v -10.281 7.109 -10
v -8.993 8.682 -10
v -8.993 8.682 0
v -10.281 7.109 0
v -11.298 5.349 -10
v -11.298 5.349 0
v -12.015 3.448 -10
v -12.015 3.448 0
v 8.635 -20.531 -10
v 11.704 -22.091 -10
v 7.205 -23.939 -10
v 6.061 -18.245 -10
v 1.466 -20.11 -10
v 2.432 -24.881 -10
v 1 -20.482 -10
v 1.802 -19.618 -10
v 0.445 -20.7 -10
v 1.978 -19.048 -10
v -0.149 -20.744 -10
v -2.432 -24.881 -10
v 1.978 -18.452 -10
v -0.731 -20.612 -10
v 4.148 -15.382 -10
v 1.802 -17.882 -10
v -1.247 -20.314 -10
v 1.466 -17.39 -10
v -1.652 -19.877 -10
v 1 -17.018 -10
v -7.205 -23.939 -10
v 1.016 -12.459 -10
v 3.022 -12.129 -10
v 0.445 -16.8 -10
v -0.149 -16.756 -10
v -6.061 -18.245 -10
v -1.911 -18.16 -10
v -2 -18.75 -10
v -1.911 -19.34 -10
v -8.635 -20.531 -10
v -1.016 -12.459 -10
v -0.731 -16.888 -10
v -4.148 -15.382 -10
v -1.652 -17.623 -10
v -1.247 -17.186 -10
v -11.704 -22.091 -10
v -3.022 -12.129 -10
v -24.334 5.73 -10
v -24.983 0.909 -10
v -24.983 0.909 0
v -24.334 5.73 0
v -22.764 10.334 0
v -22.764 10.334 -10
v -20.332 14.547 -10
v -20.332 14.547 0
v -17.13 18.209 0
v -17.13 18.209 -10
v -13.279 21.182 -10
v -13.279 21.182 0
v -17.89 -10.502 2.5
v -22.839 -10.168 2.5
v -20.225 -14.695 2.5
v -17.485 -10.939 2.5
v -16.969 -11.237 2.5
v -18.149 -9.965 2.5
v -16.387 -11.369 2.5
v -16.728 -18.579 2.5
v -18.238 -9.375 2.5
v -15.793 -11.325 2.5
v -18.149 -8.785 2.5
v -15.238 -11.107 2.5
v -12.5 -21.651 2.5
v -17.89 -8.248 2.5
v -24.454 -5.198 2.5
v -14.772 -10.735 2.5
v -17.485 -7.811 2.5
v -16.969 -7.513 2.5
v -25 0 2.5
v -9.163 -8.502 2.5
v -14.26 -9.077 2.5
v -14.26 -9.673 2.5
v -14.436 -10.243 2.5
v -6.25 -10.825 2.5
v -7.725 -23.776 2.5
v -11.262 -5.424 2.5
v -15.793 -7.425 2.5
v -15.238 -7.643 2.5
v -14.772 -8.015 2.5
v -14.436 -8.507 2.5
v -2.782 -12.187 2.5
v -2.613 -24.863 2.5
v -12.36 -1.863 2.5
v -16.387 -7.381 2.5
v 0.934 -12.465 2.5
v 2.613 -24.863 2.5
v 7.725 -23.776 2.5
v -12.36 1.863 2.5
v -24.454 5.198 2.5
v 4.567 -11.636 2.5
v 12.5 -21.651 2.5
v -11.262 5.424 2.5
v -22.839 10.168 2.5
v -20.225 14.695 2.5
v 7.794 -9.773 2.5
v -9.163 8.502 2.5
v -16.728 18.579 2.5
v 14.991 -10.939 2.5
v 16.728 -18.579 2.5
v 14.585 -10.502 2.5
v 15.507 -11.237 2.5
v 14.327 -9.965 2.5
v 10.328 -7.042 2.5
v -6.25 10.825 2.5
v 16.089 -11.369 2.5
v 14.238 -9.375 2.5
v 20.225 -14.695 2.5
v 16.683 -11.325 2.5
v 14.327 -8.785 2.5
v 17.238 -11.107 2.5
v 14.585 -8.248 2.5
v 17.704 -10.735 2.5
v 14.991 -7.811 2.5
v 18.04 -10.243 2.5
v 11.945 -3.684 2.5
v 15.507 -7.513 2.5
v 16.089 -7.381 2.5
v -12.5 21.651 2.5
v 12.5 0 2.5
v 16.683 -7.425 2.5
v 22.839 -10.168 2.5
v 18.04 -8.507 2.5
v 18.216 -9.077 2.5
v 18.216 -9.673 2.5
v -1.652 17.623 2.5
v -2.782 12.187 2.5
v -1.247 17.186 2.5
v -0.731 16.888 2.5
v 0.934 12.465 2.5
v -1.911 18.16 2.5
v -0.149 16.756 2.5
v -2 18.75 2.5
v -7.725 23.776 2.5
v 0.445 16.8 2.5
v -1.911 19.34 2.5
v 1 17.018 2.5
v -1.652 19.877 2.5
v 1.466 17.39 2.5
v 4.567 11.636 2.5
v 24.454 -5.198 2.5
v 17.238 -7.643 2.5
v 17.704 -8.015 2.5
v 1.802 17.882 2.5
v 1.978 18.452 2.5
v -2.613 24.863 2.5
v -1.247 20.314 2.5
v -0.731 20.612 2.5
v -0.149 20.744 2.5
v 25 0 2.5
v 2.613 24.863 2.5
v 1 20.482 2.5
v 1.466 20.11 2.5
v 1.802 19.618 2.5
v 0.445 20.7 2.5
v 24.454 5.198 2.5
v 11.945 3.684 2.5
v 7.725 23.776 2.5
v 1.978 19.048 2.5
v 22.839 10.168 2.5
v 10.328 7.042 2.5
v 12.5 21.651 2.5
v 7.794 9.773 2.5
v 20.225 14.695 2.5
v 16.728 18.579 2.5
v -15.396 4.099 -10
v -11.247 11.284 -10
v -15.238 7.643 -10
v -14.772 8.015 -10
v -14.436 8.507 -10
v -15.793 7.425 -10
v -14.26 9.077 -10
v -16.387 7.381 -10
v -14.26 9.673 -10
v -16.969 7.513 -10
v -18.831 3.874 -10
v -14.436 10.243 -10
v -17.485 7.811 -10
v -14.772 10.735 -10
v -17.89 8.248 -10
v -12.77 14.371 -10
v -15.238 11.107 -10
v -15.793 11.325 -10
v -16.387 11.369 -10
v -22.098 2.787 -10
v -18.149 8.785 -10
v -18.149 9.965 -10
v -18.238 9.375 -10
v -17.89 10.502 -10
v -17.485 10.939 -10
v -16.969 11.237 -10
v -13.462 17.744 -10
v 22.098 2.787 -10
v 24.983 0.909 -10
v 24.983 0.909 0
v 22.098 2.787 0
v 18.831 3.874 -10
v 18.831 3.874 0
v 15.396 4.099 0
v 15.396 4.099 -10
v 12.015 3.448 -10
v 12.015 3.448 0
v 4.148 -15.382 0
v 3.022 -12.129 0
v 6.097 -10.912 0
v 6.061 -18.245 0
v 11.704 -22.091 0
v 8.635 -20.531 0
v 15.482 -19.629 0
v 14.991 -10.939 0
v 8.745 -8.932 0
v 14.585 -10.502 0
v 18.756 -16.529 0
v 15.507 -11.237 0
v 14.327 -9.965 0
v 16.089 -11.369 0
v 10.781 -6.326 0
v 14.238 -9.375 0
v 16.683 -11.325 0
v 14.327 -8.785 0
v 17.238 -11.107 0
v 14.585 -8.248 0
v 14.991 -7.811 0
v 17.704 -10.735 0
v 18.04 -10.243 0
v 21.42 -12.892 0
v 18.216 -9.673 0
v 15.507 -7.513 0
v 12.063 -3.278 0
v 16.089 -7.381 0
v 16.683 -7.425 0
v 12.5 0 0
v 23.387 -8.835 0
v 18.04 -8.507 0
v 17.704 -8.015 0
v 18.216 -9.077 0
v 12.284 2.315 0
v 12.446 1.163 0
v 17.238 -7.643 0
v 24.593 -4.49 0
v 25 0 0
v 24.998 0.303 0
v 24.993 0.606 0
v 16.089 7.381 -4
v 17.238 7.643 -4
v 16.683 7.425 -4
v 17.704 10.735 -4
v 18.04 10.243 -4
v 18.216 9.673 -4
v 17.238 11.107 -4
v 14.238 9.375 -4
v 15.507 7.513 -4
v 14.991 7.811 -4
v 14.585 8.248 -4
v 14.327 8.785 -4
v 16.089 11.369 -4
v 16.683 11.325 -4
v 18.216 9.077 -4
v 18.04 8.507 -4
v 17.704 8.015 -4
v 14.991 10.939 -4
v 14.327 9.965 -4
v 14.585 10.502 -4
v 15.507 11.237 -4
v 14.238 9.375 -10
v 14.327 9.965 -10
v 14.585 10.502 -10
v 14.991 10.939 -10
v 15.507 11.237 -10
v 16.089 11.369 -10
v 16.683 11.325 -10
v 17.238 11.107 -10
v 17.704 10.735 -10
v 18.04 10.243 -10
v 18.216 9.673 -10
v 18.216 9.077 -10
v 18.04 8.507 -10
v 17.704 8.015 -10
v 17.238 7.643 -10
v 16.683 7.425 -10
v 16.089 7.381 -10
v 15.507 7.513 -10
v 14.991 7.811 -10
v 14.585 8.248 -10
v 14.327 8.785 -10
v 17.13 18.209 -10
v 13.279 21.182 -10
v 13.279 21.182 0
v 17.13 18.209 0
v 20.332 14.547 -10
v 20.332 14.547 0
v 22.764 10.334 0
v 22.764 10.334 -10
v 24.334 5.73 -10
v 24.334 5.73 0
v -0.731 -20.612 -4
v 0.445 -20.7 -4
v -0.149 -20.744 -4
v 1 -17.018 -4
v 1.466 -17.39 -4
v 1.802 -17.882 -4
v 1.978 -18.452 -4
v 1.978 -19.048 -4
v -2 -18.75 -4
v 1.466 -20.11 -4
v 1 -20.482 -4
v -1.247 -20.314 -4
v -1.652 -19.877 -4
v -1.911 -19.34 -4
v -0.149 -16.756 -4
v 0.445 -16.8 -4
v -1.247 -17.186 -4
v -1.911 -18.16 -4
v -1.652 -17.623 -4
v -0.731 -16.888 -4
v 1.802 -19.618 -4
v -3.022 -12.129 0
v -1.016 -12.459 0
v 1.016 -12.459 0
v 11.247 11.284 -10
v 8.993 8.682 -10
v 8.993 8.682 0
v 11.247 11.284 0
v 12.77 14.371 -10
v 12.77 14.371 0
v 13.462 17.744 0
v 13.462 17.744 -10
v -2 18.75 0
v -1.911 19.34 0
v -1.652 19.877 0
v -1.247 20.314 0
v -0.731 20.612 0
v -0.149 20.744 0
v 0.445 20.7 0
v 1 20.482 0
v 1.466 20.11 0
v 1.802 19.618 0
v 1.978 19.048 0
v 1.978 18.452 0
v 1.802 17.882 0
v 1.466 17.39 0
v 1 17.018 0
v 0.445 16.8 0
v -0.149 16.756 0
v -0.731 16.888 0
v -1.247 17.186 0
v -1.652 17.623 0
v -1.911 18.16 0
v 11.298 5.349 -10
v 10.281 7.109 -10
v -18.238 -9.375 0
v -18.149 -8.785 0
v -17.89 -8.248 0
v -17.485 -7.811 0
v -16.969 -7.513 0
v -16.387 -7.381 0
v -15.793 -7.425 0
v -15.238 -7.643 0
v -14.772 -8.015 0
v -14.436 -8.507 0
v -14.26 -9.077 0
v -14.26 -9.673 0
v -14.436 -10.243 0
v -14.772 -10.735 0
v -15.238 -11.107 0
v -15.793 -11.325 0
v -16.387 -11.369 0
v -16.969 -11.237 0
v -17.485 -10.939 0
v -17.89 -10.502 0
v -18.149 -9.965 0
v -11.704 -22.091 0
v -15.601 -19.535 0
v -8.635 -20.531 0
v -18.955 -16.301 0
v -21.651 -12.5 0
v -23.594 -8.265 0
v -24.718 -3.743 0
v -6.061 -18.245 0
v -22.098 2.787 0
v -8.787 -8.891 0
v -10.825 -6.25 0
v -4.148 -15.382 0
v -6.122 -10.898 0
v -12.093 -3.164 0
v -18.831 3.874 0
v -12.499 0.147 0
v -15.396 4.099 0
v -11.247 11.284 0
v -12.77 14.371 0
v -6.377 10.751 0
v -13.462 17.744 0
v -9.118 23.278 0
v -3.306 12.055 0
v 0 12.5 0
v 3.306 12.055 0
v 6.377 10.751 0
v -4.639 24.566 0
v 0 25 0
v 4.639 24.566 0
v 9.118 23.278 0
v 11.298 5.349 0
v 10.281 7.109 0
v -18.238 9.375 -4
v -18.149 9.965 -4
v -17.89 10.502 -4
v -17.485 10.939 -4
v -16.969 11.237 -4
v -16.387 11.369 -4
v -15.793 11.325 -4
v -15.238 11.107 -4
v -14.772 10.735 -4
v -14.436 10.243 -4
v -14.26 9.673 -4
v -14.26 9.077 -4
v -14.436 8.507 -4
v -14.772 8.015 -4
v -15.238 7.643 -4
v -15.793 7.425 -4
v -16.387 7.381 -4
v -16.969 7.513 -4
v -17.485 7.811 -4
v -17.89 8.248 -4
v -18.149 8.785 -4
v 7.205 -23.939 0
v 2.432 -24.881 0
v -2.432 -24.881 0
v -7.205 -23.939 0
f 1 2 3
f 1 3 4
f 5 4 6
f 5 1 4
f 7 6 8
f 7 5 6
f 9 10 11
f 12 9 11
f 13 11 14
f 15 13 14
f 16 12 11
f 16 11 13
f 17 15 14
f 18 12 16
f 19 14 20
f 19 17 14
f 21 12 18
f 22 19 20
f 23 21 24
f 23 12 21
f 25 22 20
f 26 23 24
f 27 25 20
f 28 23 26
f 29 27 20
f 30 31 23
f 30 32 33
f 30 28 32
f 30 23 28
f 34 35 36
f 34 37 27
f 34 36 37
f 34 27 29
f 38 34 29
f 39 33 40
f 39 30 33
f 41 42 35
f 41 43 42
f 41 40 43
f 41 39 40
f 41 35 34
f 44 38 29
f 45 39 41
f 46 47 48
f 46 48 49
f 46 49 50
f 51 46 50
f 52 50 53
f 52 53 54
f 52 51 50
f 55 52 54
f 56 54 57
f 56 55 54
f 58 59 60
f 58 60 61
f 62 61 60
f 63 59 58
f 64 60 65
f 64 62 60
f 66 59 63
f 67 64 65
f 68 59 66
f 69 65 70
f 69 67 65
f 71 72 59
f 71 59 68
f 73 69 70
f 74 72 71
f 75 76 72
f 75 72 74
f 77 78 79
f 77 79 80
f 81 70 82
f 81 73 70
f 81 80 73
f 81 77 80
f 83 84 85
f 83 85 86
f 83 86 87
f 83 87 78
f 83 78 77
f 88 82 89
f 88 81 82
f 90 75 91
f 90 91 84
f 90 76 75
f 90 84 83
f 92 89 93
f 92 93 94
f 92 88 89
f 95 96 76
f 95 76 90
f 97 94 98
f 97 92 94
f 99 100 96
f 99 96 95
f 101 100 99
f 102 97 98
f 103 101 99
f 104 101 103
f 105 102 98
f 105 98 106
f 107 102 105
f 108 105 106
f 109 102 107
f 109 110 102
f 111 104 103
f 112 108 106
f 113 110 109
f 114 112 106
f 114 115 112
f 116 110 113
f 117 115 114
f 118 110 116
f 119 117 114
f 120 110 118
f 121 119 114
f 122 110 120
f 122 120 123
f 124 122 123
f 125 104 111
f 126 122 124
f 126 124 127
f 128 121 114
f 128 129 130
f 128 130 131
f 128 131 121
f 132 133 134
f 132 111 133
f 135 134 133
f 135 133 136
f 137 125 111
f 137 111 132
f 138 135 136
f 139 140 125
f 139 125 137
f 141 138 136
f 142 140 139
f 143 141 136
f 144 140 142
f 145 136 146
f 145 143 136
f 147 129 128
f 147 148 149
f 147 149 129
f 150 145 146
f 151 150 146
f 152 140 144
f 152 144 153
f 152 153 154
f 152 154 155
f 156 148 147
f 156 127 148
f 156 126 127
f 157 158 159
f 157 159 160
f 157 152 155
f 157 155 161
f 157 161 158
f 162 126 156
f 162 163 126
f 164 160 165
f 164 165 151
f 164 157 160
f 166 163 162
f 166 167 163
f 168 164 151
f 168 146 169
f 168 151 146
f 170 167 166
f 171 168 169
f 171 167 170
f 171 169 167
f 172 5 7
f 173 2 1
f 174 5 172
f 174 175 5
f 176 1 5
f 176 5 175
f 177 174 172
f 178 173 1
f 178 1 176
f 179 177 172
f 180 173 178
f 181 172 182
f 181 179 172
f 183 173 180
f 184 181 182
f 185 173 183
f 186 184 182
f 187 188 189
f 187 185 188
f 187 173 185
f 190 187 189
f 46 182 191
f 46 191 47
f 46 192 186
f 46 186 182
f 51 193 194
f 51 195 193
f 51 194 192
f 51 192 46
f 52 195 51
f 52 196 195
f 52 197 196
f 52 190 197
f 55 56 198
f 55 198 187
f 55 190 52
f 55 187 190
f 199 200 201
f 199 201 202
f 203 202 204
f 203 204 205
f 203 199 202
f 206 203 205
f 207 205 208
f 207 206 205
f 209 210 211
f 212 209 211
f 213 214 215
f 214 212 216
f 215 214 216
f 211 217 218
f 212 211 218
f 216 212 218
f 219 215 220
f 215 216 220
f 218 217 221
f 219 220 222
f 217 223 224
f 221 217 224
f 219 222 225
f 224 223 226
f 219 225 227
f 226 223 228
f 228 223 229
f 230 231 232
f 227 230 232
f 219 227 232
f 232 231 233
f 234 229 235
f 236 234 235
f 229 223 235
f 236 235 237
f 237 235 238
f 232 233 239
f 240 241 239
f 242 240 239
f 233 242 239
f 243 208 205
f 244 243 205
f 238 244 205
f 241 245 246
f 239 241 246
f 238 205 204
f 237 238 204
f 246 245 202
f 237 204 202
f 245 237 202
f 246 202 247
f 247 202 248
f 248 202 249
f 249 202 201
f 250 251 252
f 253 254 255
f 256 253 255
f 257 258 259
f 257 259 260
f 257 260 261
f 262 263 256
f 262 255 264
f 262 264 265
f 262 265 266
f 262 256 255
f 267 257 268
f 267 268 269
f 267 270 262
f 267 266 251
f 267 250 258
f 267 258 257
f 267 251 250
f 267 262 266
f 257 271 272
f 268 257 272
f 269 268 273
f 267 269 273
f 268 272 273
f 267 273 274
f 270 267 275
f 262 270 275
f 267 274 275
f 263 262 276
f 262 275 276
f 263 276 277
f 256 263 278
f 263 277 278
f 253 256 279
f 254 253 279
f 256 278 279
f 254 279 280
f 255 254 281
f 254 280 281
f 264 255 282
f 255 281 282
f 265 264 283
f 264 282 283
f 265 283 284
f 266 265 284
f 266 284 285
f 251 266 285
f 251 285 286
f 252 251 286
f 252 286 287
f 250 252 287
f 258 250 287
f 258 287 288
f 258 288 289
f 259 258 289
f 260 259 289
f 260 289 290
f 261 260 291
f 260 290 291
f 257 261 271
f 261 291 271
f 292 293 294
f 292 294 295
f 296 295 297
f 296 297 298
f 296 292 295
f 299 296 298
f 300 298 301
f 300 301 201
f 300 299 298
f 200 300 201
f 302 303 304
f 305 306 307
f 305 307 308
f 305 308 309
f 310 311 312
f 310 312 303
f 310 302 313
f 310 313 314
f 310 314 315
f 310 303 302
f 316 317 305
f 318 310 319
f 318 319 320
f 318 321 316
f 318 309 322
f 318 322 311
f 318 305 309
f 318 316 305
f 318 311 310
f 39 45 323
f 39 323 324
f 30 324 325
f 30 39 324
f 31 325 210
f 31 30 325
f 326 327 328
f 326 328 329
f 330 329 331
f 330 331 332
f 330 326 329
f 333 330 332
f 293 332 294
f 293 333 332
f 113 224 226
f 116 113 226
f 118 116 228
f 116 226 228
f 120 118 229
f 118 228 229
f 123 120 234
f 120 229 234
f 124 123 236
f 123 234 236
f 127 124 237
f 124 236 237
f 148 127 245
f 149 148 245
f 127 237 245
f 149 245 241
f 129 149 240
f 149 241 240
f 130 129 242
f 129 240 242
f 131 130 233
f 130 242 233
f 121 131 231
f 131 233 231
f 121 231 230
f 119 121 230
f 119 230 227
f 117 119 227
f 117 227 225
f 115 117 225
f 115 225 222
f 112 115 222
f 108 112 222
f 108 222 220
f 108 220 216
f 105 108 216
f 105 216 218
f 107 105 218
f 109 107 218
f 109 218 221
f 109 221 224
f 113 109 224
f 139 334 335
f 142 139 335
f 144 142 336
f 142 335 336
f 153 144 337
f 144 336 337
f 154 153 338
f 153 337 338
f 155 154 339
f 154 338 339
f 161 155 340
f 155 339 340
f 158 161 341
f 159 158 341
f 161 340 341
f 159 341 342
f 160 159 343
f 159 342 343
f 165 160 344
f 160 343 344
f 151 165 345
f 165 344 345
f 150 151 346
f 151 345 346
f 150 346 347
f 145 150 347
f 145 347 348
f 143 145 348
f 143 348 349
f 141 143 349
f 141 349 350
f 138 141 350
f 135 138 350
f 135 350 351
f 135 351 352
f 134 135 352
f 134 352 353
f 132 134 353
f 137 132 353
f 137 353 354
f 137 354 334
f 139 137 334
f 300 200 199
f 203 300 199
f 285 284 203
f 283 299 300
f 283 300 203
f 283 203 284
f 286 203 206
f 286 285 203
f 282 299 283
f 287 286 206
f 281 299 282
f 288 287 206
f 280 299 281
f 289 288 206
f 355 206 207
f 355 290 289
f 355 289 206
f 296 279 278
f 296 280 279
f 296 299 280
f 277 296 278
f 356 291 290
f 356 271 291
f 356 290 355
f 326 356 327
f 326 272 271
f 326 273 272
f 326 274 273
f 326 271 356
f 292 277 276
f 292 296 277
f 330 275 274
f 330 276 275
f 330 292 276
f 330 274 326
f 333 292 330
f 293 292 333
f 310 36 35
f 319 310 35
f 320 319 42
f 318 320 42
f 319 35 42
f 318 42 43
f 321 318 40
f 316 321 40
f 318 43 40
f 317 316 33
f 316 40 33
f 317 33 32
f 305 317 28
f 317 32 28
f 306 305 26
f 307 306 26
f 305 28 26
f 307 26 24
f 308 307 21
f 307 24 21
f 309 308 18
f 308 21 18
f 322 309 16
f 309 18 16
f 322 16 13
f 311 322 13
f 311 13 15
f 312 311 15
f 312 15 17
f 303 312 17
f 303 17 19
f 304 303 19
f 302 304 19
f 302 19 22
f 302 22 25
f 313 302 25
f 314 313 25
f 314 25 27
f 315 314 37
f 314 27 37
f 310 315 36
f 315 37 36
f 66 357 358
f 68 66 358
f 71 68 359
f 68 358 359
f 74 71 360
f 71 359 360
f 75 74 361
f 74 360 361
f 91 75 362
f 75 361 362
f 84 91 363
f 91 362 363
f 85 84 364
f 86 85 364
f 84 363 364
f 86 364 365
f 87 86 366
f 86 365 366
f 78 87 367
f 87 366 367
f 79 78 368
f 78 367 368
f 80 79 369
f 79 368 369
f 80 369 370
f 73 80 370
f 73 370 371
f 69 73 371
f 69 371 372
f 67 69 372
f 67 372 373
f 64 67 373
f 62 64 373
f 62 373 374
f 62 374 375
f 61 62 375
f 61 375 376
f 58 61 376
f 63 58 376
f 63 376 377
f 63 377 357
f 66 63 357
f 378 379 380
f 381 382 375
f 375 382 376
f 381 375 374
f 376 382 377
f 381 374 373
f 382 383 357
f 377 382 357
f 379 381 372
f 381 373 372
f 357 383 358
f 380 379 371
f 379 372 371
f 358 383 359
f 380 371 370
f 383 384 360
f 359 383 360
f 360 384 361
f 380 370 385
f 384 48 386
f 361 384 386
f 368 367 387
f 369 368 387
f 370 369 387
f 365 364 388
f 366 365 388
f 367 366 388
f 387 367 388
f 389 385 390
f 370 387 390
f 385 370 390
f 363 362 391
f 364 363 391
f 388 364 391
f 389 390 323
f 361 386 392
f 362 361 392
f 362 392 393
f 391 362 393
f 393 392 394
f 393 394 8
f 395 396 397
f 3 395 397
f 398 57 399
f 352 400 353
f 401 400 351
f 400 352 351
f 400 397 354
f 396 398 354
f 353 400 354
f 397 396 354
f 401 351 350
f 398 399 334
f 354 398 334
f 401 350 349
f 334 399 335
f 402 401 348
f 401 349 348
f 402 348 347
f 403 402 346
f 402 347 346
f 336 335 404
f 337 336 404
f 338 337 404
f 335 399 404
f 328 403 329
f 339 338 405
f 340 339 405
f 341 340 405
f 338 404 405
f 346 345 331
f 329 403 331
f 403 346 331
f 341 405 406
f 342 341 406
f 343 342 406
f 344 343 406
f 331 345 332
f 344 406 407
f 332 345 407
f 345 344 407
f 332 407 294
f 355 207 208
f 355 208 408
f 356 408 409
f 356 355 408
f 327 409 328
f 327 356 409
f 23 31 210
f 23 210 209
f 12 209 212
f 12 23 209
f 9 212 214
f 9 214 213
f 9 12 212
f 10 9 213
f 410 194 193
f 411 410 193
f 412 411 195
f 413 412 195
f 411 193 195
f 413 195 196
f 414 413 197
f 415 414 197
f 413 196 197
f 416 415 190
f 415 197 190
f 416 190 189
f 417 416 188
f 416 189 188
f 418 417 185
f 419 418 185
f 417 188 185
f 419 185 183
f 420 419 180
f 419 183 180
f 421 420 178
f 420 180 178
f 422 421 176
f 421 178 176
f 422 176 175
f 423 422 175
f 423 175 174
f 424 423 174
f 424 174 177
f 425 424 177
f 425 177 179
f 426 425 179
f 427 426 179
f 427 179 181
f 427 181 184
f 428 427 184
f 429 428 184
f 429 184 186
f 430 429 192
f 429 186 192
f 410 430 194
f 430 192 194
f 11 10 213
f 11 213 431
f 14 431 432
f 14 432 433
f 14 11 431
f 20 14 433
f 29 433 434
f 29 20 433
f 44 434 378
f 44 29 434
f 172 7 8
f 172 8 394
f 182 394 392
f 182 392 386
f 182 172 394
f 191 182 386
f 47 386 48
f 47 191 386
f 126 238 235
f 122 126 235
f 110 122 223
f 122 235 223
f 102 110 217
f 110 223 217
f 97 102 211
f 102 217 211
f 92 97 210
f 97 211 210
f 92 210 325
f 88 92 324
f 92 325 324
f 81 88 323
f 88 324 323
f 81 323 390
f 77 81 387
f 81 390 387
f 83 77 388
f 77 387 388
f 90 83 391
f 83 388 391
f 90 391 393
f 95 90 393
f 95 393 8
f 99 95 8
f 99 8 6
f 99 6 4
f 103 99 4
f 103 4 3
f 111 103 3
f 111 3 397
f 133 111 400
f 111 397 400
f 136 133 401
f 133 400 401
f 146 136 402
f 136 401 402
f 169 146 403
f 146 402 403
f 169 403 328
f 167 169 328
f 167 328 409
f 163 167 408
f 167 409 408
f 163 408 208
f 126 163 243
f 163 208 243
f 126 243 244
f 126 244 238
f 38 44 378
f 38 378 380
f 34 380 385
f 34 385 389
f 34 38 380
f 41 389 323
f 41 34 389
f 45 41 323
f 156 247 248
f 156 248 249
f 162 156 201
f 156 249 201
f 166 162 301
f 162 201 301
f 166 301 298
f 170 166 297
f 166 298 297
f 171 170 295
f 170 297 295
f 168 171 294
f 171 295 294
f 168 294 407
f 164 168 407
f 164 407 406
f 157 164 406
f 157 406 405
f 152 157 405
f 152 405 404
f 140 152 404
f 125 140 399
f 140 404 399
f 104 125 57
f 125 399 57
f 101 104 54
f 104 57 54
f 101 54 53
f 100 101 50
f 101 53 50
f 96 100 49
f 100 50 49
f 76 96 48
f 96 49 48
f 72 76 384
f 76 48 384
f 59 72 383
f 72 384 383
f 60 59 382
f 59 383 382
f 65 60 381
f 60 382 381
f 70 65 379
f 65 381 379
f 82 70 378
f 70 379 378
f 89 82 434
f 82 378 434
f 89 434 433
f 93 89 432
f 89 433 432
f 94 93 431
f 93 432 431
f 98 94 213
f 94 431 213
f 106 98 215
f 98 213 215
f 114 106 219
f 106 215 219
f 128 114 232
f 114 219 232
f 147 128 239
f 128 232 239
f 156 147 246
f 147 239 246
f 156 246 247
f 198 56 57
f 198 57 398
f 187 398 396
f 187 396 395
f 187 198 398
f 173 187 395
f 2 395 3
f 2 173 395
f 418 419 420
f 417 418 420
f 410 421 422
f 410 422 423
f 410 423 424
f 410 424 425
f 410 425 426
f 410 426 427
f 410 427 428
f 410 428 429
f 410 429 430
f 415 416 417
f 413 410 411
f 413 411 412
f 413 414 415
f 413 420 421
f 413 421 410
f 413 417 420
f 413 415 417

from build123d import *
from build123d.topology import SkipClean

# Parameters (mm, degrees)
SKETCH1_R           = 25
BOSS_EXTRUDE1_DEPTH = 2.5
BOSS_EXTRUDE2_START = 10
BOSS_EXTRUDE2_DEPTH = 10
SKETCH4_R           = 12.5
CUT_EXTRUDE1_DEPTH  = 8.2
SKETCH6_R           = 2
CUT_EXTRUDE3_DEPTH  = 6
SKETCH8_R           = 2
CUT_EXTRUDE4_DEPTH  = 6


with BuildPart() as part:
    # Sketch1 → Boss-Extrude1 (new body)
    with BuildSketch(Plane.XY):
        Circle(SKETCH1_R)
    extrude(amount=BOSS_EXTRUDE1_DEPTH)

    # Sketch3 → Boss-Extrude2 (add)
    with SkipClean():  # the faces are left unmerged after this step: merging them gives an invalid solid
        with BuildSketch(Plane(origin=(0, 0, 0), x_dir=(-1, 0, 0), z_dir=(0, 0, -1)).offset(BOSS_EXTRUDE2_START)):
            with BuildLine():
                ThreePointArc((-3.021915591, -12.129221993), (-6.060912506, -18.245026612), (-11.704264354, -22.090952807))
                ThreePointArc((-11.704264354, -22.090952807), (0, -25), (11.704264354, -22.090952807))
                ThreePointArc((11.704264354, -22.090952807), (6.060912506, -18.245026612), (3.021915591, -12.129221993))
                ThreePointArc((3.021915591, -12.129221993), (0, -12.5), (-3.021915591, -12.129221993))
            make_face()
            with BuildLine():
                ThreePointArc((-24.983458502, 0.909286141), (-18.831112792, 3.873609106), (-12.01517217, 3.447555327))
                ThreePointArc((-12.01517217, 3.447555327), (-10.825317547, 6.25), (-8.993256579, 8.681666667))
                ThreePointArc((-8.993256579, 8.681666667), (-12.770200286, 14.371417506), (-13.279194148, 21.181666667))
                ThreePointArc((-13.279194148, 21.181666667), (-21.650635095, 12.5), (-24.983458502, 0.909286141))
            make_face()
            with BuildLine():
                ThreePointArc((12.01517217, 3.447555327), (18.831112792, 3.873609106), (24.983458502, 0.909286141))
                ThreePointArc((24.983458502, 0.909286141), (21.650635095, 12.5), (13.279194148, 21.181666667))
                ThreePointArc((13.279194148, 21.181666667), (12.770200286, 14.371417506), (8.993256579, 8.681666667))
                ThreePointArc((8.993256579, 8.681666667), (10.825317547, 6.25), (12.01517217, 3.447555327))
            make_face()
        extrude(amount=-BOSS_EXTRUDE2_DEPTH)

    # Sketch4 → Cut-Extrude1 (cut)
    with SkipClean():  # the faces are left unmerged after this step: merging them gives an invalid solid
        with BuildSketch(Plane(origin=(0, 0, 0), x_dir=(-1, 0, 0), z_dir=(0, 0, -1))):
            with Locations(Location((0, 0, 0), (0, 0, 180))):
                Circle(SKETCH4_R)
        extrude(amount=-CUT_EXTRUDE1_DEPTH, mode=Mode.SUBTRACT)

    # Sketch6 → Cut-Extrude3 (cut)
    with SkipClean():  # the faces are left unmerged after this step: merging them gives an invalid solid
        with BuildSketch(Plane(origin=(0, 0, -10), x_dir=(-1, 0, 0), z_dir=(0, 0, -1))):
            with Locations((16.237976321, 9.375)):
                Circle(SKETCH6_R)
            with Locations((0, -18.75)):
                Circle(SKETCH6_R)
            with Locations((-16.237976321, 9.375)):
                Circle(SKETCH6_R)
        extrude(amount=-CUT_EXTRUDE3_DEPTH, mode=Mode.SUBTRACT)

    # Sketch8 → Cut-Extrude4 (cut)
    with SkipClean():  # the faces are left unmerged after this step: merging them gives an invalid solid
        with BuildSketch(Plane(origin=(0, 0, 0), x_dir=(-1, 0, 0), z_dir=(0, 0, -1))):
            with Locations((-16.237976321, -9.375)):
                Circle(SKETCH8_R)
            with Locations((0, 18.75)):
                Circle(SKETCH8_R)
            with Locations((16.237976321, -9.375)):
                Circle(SKETCH8_R)
        extrude(amount=-CUT_EXTRUDE4_DEPTH, mode=Mode.SUBTRACT)


solid = part.part
